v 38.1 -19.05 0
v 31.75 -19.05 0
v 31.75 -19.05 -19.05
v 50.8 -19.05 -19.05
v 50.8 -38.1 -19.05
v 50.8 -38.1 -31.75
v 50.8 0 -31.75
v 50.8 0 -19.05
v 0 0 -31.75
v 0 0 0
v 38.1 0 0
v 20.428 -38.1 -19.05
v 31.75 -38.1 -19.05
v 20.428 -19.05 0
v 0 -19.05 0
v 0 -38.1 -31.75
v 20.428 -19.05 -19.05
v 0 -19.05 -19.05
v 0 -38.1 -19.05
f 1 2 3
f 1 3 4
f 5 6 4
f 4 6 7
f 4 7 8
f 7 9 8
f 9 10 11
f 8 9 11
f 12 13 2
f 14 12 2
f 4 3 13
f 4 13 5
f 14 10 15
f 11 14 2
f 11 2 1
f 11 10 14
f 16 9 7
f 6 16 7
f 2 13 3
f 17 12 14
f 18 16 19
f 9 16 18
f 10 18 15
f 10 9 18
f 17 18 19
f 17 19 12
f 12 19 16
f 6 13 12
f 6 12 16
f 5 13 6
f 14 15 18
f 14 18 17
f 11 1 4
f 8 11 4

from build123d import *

# Parameters (mm, degrees)
F0_W     = 50.8
F0_H     = 31.75
F1_DEPTH = 38.1
F2_W     = 19.05
F2_H     = 19.05
F3_DEPTH = 19.05
F4_W     = 20.428084
F4_H     = 19.05
F5_DEPTH = 19.05
F7_DEPTH = 25.4
F9_DEPTH = 25.4


with BuildPart() as f1:
    # F0 (on Front) → F1 (new body)
    with BuildSketch(Plane.XZ):
        with Locations((25.4, -15.875)):
            Rectangle(F0_W, F0_H)
    extrude(amount=F1_DEPTH)

    # F2 (on face) → F3 (cut)
    with BuildSketch(Plane.XY):
        with Locations((41.275, -28.575)):
            Rectangle(F2_W, F2_H)
    extrude(amount=-F3_DEPTH, mode=Mode.SUBTRACT)

    # F4 (on face) → F5 (cut)
    with BuildSketch(Plane.XY):
        with Locations((10.214042, -28.575)):
            Rectangle(F4_W, F4_H)
    extrude(amount=-F5_DEPTH, mode=Mode.SUBTRACT)

    # F6 (on face) → F7 (cut)
    with BuildSketch(Plane.YZ.offset(31.75)):
        Polygon((-38.1, -19.05), (-19.05, 0), (-38.1, 0), align=None)
    extrude(amount=-F7_DEPTH, mode=Mode.SUBTRACT)

    # F8 (on face) → F9 (cut)
    with BuildSketch(Plane.XZ.offset(19.05)):
        Polygon((50.8, 0), (38.1, 0), (50.8, -19.05), align=None)
    extrude(amount=-F9_DEPTH, mode=Mode.SUBTRACT)


solid = f1.part
